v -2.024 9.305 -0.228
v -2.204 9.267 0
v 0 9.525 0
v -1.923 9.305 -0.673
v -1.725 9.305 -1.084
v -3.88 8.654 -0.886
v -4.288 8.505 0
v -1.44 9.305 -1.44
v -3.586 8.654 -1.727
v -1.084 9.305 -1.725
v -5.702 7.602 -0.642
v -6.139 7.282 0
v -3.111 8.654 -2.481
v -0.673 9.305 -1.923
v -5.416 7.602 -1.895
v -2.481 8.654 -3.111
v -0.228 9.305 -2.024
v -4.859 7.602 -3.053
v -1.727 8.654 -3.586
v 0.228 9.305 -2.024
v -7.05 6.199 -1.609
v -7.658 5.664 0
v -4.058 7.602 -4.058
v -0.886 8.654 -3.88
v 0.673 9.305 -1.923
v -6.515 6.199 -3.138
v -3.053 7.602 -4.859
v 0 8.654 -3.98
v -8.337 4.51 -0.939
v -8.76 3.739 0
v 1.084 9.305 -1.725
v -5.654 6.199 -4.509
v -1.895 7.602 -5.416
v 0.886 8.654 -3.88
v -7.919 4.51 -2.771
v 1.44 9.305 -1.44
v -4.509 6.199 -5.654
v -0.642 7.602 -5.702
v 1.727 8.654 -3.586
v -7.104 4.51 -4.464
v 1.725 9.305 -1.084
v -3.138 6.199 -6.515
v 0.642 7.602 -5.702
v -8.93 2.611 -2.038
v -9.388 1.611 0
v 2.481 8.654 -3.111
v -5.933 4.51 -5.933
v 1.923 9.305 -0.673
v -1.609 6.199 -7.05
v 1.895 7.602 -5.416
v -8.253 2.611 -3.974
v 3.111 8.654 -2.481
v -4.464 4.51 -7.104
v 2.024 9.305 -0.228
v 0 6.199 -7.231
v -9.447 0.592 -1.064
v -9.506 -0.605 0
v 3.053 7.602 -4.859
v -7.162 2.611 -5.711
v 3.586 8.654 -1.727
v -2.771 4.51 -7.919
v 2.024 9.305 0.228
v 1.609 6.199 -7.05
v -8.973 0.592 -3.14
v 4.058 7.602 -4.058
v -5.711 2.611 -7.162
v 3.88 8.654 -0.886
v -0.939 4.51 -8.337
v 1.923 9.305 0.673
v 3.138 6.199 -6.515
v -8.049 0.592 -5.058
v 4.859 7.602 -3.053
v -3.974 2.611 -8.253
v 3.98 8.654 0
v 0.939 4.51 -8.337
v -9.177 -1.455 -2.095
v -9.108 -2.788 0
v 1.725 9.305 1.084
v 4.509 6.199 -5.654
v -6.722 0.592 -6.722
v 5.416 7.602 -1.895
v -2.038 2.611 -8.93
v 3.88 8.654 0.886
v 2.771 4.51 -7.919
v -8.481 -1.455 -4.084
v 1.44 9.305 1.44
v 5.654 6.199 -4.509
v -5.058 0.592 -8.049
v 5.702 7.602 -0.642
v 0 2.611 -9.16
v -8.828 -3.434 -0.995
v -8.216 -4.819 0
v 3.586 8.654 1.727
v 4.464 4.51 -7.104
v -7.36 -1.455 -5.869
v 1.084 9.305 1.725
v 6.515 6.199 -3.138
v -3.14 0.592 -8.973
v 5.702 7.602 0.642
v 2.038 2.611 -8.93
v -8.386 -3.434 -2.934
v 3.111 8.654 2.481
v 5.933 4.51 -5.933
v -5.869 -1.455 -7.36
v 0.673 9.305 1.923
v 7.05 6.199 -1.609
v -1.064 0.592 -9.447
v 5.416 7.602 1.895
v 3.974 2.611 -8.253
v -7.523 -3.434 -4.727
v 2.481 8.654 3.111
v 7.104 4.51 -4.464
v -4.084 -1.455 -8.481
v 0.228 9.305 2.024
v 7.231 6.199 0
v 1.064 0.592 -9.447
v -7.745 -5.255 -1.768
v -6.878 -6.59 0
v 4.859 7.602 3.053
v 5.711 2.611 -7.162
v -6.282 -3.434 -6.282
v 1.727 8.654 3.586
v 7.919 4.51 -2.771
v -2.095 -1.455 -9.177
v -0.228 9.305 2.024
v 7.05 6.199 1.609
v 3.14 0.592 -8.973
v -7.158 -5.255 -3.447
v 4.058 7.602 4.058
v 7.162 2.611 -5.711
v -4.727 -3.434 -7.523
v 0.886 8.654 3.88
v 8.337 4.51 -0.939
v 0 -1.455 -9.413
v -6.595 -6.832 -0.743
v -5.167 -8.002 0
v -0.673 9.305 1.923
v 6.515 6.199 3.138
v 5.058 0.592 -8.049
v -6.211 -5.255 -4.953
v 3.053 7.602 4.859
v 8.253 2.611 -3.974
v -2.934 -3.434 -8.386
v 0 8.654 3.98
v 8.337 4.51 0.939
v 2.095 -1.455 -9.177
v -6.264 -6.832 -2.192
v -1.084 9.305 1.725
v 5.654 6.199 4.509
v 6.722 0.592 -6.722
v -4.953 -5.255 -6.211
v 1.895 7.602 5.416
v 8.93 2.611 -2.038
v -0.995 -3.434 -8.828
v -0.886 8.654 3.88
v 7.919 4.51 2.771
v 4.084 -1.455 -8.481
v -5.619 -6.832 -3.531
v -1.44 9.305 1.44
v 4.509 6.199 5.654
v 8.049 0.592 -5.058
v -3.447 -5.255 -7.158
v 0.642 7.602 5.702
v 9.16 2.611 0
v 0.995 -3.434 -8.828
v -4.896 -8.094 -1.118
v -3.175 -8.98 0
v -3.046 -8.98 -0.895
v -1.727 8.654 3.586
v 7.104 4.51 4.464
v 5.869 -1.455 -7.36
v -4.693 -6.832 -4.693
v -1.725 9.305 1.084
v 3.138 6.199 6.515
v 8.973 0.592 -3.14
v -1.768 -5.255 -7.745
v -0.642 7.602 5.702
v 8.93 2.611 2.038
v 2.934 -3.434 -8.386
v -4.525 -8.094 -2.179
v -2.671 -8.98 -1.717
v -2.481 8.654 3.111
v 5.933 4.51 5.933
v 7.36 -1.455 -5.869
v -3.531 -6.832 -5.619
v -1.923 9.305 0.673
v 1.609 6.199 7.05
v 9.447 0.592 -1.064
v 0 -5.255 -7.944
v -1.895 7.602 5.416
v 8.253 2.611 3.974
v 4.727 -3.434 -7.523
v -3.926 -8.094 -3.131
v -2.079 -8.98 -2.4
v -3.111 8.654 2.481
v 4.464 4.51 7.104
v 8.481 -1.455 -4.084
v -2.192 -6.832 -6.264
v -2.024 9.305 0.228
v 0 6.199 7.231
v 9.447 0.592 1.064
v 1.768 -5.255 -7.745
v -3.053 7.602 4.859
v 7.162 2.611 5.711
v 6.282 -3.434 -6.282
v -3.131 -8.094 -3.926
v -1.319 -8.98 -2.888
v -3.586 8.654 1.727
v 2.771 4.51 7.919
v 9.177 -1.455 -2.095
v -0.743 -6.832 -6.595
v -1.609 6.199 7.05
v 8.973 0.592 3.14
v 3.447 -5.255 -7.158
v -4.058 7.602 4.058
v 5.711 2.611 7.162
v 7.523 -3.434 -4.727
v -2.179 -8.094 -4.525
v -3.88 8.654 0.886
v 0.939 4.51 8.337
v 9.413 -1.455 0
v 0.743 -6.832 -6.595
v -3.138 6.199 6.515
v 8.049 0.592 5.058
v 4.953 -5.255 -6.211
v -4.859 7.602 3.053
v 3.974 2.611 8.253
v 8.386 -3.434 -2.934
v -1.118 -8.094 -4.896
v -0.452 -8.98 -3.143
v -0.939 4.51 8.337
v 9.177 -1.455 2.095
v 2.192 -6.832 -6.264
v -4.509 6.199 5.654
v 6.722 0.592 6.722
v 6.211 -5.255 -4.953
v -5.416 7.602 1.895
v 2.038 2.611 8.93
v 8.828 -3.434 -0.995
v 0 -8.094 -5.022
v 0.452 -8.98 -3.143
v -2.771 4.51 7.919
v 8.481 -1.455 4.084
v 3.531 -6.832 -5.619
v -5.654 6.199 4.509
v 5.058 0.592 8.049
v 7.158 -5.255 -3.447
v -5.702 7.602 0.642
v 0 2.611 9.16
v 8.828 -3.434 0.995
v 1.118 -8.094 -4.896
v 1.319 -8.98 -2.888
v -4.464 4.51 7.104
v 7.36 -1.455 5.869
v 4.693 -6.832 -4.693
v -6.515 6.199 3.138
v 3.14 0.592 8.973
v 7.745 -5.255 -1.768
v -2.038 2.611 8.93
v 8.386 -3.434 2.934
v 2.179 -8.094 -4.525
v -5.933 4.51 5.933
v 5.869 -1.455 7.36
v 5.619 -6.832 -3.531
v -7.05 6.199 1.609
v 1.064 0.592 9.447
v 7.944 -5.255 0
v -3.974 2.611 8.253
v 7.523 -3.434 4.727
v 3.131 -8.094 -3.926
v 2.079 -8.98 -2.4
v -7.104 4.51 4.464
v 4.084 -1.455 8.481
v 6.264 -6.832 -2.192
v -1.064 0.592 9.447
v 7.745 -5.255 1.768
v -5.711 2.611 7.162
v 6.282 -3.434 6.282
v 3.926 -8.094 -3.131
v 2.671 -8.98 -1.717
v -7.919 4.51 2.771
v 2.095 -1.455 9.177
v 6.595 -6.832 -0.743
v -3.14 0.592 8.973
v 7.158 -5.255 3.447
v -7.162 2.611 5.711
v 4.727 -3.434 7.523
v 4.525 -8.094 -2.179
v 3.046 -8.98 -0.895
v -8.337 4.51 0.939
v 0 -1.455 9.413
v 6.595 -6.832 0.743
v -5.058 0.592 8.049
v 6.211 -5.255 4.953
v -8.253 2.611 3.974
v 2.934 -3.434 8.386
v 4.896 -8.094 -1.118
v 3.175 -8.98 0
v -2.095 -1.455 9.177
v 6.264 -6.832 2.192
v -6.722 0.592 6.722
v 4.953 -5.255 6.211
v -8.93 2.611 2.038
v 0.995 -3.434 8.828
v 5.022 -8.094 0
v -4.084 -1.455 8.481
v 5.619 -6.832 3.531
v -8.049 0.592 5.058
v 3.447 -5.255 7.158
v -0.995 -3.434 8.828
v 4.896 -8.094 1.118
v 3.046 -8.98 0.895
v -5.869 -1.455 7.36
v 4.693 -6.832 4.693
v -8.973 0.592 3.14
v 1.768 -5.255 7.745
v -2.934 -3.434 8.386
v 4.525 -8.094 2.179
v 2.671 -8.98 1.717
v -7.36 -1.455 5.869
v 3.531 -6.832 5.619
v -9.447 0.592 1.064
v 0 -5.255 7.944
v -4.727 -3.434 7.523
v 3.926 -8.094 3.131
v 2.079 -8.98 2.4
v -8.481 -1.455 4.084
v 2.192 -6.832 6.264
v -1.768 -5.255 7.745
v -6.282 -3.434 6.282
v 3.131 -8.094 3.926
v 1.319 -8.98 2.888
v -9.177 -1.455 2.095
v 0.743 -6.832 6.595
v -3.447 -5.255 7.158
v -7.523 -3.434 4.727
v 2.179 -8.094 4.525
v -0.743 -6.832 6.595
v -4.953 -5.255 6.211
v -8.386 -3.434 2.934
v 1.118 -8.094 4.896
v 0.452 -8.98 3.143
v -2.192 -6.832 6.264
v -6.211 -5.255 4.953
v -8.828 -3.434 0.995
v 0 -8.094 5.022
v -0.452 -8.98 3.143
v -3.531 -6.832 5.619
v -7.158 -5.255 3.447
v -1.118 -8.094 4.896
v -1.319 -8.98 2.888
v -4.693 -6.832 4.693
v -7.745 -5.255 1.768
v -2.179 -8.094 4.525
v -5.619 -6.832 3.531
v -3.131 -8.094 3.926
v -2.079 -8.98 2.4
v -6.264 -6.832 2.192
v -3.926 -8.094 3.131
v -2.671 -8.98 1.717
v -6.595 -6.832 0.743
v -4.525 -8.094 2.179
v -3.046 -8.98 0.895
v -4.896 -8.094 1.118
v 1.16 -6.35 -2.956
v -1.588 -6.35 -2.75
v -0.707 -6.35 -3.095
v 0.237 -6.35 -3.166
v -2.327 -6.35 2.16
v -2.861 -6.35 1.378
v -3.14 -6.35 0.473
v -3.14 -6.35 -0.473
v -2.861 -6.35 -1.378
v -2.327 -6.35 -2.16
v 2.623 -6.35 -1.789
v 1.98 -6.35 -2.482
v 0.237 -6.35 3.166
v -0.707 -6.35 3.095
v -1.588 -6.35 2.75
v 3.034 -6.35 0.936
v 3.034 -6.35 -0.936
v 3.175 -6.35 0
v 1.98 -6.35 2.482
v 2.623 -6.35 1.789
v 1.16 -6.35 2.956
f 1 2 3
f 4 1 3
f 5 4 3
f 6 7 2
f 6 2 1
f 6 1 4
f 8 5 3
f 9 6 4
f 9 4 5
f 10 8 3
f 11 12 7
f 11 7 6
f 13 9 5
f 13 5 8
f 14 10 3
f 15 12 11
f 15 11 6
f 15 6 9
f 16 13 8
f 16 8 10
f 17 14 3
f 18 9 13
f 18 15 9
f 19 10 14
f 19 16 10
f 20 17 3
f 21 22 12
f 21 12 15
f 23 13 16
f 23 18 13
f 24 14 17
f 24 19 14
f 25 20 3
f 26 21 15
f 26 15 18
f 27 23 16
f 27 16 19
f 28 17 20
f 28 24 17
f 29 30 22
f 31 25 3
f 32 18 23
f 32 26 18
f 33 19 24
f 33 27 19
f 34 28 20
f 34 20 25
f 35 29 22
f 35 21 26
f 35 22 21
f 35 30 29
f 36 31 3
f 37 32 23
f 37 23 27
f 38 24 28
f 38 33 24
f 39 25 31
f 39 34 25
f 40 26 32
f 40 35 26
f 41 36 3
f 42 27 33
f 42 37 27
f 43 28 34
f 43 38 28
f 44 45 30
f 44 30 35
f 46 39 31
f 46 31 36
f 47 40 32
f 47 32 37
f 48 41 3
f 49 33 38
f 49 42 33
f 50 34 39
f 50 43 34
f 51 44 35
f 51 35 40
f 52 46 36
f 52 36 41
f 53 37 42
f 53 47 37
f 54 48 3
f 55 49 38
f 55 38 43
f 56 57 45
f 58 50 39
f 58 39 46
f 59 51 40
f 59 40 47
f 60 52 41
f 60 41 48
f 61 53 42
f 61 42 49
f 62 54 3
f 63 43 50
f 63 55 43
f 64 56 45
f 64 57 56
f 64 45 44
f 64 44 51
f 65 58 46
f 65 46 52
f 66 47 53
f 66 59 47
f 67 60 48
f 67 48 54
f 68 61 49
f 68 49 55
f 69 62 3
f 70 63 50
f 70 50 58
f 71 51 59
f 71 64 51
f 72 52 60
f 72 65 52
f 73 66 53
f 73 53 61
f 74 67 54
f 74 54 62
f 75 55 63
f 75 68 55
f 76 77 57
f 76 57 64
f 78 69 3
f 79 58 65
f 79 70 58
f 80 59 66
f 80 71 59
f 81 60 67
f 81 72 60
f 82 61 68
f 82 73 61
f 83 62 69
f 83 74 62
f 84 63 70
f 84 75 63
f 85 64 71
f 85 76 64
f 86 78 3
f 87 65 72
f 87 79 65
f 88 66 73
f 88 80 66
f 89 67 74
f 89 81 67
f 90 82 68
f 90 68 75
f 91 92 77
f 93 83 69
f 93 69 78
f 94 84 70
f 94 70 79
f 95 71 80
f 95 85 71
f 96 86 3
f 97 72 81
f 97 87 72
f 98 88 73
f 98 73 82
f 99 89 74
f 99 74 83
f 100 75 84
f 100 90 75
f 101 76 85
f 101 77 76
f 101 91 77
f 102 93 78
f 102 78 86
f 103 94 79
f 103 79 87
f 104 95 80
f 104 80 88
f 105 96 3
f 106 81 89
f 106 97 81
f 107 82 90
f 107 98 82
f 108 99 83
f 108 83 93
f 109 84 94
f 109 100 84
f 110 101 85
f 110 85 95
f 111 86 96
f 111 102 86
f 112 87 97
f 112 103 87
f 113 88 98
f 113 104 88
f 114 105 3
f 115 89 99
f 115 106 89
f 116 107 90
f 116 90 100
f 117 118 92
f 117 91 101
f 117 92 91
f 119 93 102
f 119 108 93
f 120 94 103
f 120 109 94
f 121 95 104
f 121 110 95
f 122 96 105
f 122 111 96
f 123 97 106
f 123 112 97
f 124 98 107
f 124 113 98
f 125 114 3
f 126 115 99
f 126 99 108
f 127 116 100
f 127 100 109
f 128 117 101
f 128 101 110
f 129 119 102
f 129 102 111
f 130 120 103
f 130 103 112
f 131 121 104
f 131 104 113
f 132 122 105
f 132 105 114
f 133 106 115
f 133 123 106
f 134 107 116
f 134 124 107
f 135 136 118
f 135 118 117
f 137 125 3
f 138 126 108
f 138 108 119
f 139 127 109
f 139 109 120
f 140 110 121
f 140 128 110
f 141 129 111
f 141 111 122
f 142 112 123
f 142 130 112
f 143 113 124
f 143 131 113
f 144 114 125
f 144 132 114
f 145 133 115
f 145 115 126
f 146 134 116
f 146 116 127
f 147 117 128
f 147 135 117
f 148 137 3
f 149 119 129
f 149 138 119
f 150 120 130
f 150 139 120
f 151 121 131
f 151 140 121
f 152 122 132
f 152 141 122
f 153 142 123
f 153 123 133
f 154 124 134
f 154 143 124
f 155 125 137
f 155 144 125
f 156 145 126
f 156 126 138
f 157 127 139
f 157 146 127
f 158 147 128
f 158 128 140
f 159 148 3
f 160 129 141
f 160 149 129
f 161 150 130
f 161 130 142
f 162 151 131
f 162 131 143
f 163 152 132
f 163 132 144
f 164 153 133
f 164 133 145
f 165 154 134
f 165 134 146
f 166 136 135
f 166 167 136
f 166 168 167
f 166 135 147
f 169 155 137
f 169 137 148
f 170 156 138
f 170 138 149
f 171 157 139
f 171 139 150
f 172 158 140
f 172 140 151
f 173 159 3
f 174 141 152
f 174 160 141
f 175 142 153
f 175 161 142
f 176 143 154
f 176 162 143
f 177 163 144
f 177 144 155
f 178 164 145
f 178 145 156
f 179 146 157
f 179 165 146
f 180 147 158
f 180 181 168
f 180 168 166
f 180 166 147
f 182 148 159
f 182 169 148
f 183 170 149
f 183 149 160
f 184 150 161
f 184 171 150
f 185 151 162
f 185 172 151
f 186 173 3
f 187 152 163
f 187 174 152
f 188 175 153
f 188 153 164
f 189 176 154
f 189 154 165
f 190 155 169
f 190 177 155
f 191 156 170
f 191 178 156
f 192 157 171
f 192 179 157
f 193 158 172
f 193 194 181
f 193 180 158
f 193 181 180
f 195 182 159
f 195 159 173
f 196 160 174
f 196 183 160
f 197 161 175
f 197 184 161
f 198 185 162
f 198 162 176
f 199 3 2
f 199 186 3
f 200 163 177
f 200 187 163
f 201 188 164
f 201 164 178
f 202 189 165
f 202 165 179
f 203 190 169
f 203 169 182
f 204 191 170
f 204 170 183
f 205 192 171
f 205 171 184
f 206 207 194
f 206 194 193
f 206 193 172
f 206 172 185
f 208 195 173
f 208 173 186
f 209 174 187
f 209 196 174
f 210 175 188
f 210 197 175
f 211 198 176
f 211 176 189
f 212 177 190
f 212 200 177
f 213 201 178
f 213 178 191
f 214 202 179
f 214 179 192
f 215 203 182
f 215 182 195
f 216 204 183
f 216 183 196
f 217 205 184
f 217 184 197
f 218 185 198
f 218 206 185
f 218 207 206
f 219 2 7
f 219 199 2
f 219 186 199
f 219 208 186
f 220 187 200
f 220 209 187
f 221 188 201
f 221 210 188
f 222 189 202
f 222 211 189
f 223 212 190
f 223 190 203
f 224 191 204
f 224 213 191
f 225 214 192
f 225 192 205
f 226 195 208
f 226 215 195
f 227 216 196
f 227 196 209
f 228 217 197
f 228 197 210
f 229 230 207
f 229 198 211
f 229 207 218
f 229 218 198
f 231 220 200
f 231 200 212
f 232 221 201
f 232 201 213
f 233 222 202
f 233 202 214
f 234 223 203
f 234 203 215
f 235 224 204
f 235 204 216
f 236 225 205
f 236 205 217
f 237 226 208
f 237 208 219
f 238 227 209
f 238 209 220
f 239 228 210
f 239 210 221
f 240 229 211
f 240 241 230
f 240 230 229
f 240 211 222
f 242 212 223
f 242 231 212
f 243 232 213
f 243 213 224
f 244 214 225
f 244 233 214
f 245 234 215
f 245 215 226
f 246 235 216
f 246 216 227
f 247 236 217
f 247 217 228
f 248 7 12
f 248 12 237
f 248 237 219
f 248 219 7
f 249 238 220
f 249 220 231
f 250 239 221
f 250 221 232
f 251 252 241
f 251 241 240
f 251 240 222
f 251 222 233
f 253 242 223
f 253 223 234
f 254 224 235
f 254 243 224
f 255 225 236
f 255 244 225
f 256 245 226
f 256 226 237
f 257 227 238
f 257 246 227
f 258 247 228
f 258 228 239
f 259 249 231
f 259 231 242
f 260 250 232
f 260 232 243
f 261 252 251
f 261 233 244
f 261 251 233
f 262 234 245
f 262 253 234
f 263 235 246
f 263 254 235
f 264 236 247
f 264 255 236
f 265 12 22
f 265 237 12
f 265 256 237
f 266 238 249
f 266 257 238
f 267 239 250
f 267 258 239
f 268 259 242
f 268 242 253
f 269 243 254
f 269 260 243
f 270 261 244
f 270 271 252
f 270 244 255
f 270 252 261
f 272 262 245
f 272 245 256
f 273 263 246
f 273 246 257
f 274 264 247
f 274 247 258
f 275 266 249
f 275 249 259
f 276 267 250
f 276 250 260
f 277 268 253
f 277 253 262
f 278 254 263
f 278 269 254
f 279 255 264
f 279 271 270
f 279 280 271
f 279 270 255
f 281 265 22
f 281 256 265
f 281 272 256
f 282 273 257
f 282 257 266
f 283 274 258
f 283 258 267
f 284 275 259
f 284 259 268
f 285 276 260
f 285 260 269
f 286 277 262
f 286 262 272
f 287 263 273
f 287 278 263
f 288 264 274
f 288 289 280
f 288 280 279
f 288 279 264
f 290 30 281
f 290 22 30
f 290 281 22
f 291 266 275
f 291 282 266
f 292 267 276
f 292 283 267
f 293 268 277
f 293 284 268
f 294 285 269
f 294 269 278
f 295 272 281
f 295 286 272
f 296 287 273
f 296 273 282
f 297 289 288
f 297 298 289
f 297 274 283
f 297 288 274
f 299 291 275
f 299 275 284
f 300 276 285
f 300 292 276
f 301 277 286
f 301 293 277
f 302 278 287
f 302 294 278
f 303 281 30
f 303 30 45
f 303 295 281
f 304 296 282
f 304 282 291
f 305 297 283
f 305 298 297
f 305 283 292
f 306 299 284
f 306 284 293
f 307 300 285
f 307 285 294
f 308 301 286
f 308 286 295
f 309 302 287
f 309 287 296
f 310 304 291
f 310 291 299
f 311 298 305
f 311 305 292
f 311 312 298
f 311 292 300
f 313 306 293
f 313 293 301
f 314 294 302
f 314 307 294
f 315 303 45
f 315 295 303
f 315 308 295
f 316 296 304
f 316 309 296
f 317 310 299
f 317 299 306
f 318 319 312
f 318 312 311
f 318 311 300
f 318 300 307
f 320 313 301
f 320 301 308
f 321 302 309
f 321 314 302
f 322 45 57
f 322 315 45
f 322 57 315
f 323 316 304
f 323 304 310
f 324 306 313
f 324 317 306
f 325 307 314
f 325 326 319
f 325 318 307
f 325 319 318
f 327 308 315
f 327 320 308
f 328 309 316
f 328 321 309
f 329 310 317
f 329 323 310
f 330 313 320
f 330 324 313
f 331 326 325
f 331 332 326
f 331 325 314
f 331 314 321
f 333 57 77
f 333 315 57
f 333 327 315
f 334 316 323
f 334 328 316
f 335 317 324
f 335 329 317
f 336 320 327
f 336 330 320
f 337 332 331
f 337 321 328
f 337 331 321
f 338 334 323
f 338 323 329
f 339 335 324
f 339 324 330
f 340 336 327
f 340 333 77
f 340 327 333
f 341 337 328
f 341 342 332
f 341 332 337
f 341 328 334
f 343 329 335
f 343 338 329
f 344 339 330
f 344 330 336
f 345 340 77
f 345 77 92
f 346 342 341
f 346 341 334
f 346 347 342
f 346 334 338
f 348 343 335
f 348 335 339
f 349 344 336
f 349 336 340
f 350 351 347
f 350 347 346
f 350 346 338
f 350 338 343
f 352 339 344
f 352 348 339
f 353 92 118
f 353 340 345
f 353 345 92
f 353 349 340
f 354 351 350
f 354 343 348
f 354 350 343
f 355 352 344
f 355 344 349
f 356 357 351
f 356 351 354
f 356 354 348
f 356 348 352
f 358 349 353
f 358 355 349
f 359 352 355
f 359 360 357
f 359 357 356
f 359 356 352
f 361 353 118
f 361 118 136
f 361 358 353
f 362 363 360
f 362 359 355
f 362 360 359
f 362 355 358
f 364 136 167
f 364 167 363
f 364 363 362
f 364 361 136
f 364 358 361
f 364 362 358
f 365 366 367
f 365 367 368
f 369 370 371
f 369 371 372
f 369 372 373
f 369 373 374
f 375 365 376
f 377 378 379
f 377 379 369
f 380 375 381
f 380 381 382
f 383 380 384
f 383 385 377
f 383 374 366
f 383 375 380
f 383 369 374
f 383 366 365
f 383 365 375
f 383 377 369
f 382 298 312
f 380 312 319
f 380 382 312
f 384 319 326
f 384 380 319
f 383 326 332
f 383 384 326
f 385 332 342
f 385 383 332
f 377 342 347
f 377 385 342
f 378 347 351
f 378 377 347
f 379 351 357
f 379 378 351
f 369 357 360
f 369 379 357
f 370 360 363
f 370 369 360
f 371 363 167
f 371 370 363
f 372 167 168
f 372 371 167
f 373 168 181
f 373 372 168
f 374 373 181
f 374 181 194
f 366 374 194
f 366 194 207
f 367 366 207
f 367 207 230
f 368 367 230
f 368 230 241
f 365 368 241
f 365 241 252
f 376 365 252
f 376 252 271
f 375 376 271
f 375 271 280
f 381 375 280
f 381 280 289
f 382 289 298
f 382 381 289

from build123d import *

# Parameters (mm, degrees)
F3_R     = 3.175
F4_DEPTH = 25.4


with BuildPart() as f1:
    # F0 (on Top) → F1 (revolve)
    with BuildSketch(Plane.XY):
        with BuildLine():
            Line((0, -9.525), (0, 9.525))
            ThreePointArc((0, 9.525), (-9.525, 0), (0, -9.525))
        make_face()
    revolve(axis=Axis((0, 0, 0), (0, -1, 0)))


with BuildPart() as f4:
    # F3 (on offset) → F4 (new body)
    with BuildSketch(Plane.XZ.offset(6.35)):
        Circle(F3_R)
    extrude(amount=F4_DEPTH)


with BuildPart() as f1_1:
    add(f1.part)

    # F5: cut F4
    add(f4.part, mode=Mode.SUBTRACT)


solid = f1_1.part
